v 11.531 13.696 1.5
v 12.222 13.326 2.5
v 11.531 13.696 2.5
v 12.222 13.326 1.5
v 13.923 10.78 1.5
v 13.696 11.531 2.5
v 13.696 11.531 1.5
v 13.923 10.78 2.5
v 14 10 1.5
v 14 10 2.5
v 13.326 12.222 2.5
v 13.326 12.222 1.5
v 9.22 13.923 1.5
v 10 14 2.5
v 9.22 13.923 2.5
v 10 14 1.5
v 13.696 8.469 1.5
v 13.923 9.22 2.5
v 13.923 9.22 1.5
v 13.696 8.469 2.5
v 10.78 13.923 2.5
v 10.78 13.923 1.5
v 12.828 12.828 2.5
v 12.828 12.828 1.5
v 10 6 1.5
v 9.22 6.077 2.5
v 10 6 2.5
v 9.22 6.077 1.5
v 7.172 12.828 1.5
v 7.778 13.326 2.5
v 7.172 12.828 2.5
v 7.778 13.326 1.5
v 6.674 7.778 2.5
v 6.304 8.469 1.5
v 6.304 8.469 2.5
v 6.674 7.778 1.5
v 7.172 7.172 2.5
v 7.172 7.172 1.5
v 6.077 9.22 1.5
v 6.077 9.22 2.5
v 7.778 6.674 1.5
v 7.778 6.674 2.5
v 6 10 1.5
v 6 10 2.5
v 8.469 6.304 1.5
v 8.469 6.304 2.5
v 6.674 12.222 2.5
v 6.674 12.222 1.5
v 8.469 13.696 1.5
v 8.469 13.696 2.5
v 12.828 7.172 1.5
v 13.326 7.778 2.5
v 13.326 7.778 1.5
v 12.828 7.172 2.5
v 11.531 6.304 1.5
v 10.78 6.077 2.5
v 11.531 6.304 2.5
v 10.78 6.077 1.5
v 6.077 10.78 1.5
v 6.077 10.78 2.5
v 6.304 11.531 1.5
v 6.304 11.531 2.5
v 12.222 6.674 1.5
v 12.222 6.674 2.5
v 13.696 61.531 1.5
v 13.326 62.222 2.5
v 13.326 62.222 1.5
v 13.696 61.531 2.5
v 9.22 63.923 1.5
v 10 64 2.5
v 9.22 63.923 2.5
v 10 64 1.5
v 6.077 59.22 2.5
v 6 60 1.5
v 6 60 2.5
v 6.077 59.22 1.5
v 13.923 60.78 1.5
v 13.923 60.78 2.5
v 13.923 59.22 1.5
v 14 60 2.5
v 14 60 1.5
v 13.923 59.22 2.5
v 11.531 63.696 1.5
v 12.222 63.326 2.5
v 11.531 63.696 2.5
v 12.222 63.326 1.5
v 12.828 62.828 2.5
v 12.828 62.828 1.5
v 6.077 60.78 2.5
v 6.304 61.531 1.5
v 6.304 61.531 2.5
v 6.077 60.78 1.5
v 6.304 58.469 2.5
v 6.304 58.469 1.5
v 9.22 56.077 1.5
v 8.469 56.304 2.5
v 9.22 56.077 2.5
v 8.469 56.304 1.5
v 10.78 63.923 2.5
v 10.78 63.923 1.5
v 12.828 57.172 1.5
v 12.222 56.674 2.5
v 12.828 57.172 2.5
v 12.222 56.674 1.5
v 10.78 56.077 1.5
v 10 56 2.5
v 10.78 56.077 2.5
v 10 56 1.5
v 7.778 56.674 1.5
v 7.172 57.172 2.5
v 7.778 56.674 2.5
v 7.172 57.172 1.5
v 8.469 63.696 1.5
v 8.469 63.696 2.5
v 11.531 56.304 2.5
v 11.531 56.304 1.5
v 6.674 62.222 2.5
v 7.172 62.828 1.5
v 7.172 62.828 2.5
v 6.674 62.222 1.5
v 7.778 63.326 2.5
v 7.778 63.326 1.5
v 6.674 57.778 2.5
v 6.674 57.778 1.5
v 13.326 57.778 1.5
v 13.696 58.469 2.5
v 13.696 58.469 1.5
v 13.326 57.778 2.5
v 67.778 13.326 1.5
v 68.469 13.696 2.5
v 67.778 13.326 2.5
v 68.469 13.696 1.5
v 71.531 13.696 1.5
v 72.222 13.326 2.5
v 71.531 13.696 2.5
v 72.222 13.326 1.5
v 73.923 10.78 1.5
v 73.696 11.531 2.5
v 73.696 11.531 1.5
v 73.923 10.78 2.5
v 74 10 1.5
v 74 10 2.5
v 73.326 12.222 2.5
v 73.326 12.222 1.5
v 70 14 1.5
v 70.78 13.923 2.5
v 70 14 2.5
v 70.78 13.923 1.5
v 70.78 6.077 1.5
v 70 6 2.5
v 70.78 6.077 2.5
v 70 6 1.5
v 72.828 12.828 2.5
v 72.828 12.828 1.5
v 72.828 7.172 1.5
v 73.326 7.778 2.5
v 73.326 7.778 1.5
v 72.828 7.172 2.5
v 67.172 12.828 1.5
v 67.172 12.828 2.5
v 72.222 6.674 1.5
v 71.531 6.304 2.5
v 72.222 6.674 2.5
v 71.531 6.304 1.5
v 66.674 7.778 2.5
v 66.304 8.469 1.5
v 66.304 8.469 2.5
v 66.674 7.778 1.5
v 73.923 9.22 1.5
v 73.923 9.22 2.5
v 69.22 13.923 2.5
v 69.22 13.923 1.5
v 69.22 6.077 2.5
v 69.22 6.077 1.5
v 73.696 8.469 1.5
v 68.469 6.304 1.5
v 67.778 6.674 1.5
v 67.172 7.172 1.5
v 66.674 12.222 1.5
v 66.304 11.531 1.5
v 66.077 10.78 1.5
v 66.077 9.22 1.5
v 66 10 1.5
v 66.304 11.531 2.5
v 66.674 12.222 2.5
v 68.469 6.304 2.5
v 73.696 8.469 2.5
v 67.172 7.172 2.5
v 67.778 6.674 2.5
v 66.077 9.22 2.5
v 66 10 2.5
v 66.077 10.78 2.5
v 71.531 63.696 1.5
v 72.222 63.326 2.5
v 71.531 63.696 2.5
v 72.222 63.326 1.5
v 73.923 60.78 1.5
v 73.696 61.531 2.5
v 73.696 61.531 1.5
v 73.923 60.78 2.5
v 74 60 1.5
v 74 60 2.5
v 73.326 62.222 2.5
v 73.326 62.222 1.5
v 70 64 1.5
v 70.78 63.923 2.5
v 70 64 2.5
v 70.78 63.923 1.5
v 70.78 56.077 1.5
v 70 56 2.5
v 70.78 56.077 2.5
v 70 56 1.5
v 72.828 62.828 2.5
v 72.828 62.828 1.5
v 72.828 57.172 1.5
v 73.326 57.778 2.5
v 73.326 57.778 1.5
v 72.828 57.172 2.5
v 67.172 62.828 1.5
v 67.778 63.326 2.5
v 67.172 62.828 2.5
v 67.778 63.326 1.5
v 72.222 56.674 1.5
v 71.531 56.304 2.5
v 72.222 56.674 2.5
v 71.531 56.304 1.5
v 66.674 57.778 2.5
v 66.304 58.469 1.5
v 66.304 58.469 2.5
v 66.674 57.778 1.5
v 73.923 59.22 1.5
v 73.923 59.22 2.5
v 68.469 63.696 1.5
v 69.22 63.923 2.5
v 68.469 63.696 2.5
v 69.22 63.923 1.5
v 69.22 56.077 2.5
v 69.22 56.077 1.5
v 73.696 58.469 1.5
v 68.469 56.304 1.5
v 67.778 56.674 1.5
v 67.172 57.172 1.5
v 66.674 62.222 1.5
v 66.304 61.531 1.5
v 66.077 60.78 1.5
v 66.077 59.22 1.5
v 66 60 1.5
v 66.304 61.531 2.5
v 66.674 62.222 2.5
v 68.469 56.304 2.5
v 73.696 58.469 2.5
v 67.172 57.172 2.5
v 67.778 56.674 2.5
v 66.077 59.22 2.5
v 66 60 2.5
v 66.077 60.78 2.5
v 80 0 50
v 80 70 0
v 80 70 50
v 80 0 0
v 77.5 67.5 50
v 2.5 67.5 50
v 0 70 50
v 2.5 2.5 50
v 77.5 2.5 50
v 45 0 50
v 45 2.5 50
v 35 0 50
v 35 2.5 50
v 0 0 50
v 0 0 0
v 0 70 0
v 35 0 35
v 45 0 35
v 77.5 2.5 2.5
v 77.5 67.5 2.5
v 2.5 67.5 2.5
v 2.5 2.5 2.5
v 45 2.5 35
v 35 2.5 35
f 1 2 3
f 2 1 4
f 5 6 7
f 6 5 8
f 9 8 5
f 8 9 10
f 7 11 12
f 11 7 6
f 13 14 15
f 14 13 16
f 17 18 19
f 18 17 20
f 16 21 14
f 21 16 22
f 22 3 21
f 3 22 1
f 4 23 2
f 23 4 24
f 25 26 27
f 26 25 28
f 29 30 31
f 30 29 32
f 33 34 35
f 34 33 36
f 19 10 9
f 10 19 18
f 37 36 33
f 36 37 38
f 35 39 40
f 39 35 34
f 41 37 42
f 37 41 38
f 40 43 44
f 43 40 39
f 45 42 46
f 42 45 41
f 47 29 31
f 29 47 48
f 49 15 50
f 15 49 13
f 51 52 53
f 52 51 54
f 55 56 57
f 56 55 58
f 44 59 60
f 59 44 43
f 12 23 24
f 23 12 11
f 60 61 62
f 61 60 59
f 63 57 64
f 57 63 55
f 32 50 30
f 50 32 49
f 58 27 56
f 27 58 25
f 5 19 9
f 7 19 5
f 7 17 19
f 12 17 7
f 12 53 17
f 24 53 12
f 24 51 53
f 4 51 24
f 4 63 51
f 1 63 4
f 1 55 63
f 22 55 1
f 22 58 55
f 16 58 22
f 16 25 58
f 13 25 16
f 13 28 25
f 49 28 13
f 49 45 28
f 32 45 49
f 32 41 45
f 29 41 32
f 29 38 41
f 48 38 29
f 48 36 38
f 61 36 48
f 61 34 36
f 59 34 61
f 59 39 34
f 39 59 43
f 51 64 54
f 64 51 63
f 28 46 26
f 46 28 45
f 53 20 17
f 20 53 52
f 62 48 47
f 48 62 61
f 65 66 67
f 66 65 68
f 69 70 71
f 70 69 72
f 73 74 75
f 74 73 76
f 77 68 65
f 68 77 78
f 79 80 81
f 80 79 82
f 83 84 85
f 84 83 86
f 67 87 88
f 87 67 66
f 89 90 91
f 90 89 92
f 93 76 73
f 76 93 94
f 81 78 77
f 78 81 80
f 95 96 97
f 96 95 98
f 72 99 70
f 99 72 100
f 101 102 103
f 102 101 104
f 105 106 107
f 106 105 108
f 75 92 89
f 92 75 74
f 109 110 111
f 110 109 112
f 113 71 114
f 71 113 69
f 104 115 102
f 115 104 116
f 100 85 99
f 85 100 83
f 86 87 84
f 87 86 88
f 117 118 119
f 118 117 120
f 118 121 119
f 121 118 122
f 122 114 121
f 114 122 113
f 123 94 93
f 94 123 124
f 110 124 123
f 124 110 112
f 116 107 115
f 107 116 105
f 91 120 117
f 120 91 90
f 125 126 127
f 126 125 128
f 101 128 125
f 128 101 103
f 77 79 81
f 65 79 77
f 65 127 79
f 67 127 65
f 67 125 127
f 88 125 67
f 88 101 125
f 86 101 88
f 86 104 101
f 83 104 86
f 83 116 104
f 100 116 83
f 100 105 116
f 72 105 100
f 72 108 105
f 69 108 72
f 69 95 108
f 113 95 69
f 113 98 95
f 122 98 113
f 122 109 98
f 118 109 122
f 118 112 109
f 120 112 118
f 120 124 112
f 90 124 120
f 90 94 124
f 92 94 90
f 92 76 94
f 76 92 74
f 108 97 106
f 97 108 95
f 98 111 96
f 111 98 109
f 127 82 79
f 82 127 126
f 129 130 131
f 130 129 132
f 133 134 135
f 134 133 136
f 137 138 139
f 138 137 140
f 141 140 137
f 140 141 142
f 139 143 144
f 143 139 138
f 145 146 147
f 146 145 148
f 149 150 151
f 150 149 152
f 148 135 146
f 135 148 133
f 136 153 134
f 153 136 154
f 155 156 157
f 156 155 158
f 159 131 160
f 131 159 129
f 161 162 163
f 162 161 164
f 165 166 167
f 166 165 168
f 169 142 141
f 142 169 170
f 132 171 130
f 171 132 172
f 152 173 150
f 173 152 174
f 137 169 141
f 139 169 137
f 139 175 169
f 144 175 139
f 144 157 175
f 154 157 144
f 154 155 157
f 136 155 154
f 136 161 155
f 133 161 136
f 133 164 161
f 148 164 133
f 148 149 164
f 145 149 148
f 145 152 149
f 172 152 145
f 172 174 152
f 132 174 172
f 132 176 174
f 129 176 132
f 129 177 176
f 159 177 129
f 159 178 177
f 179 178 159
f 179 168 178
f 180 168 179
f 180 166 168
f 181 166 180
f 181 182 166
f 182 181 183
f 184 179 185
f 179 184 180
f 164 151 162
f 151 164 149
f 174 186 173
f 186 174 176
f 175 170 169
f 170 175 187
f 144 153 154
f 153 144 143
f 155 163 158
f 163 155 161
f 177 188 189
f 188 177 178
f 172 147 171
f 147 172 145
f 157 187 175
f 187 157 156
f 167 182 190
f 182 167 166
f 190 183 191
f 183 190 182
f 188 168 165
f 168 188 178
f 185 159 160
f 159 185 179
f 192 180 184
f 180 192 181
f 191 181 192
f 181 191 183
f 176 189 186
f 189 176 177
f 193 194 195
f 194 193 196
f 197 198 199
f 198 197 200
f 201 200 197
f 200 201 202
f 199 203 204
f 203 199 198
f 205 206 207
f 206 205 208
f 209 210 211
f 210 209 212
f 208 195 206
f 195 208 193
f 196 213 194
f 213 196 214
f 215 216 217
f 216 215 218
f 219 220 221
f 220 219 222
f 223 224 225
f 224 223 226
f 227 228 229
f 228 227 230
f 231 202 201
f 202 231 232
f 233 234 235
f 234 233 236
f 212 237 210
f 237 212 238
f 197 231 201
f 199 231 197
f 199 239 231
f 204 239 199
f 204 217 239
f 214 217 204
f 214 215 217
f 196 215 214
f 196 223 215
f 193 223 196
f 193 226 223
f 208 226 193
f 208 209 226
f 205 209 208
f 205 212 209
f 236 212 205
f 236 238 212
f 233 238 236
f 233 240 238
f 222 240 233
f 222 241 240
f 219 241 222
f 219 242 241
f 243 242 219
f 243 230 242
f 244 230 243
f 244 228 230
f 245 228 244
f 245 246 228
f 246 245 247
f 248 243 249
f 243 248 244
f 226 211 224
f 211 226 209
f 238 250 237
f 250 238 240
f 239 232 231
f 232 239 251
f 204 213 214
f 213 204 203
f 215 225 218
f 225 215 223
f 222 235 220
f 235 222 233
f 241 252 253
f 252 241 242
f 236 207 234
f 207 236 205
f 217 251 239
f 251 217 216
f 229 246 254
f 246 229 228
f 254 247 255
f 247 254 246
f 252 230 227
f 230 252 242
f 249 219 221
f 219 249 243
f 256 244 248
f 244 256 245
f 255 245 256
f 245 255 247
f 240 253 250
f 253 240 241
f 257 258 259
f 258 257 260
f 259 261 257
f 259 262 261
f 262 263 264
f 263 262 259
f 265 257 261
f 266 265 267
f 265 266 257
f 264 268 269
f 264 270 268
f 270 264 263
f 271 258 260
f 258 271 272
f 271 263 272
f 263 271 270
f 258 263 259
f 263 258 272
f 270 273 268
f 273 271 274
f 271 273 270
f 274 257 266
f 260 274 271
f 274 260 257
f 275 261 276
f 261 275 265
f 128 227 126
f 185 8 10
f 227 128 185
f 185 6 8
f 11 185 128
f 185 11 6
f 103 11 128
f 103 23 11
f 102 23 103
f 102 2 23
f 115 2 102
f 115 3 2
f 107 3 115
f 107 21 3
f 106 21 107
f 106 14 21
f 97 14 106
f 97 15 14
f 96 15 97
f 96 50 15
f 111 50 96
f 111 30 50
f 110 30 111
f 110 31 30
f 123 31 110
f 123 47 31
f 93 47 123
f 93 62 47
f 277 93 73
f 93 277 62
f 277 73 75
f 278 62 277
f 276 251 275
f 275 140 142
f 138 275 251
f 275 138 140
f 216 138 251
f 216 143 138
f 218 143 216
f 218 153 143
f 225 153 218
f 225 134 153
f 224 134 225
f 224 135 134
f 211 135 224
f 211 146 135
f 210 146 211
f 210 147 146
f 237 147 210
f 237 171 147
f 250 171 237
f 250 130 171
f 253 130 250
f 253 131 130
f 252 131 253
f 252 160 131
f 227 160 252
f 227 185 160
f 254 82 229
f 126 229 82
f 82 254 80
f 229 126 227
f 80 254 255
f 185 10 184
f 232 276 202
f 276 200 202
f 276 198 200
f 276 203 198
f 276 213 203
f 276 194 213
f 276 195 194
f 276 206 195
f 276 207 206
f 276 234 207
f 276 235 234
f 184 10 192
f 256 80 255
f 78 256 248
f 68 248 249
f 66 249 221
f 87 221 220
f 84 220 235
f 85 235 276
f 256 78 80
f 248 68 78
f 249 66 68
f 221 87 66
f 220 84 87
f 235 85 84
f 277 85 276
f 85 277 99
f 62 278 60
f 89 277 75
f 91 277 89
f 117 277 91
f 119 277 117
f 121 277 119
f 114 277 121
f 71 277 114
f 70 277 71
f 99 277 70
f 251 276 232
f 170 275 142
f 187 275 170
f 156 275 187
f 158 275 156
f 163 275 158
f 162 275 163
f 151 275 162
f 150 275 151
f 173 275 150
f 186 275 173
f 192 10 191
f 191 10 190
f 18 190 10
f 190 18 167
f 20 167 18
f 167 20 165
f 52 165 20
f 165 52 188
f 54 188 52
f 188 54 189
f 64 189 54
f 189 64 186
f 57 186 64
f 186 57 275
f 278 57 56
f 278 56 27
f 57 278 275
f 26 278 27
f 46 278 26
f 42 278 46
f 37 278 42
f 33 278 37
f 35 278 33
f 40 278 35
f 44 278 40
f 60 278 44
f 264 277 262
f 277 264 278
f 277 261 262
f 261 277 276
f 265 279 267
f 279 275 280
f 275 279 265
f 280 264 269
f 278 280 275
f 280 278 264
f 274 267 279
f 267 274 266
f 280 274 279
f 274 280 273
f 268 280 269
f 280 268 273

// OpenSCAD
$fn = 32;

// ----------------------------------------------------------------------
// Enclosure box: both enclosure
// ----------------------------------------------------------------------

// --- parameters (mm) ---
box_l = 80;               // outer length, X
box_w = 70;               // outer width, Y
box_h = 50;               // outer height
wall_t = 2.5;             // wall thickness
boss_r = 4;               // corner boss radius
hole_r = 1.5;             // boss screw hole radius
boss_in = 10;             // boss inset from the corners
notch_w = 10;             // cable notch width
notch_h = 15;             // cable notch height

inner_h = box_h - wall_t;  // cavity depth
boss_h = inner_h - 2;  // corner boss height

difference() {
  cube([box_l, box_w, box_h]);
  translate([wall_t, wall_t, wall_t])
    cube([box_l - 2 * wall_t, box_w - 2 * wall_t, box_h]);
  for (sx = [0, 1], sy = [0, 1])
    translate([sx ? box_l - boss_in : boss_in,
               sy ? box_w - boss_in : boss_in, wall_t - 1]) {
      cylinder(r = boss_r, h = boss_h);
      translate([0, 0, boss_h - 4])
        cylinder(r = hole_r, h = 5);
    }
  translate([box_l / 2 - notch_w / 2, -1, box_h - notch_h])
    cube([notch_w, wall_t + 2, notch_h + 1]);
}
